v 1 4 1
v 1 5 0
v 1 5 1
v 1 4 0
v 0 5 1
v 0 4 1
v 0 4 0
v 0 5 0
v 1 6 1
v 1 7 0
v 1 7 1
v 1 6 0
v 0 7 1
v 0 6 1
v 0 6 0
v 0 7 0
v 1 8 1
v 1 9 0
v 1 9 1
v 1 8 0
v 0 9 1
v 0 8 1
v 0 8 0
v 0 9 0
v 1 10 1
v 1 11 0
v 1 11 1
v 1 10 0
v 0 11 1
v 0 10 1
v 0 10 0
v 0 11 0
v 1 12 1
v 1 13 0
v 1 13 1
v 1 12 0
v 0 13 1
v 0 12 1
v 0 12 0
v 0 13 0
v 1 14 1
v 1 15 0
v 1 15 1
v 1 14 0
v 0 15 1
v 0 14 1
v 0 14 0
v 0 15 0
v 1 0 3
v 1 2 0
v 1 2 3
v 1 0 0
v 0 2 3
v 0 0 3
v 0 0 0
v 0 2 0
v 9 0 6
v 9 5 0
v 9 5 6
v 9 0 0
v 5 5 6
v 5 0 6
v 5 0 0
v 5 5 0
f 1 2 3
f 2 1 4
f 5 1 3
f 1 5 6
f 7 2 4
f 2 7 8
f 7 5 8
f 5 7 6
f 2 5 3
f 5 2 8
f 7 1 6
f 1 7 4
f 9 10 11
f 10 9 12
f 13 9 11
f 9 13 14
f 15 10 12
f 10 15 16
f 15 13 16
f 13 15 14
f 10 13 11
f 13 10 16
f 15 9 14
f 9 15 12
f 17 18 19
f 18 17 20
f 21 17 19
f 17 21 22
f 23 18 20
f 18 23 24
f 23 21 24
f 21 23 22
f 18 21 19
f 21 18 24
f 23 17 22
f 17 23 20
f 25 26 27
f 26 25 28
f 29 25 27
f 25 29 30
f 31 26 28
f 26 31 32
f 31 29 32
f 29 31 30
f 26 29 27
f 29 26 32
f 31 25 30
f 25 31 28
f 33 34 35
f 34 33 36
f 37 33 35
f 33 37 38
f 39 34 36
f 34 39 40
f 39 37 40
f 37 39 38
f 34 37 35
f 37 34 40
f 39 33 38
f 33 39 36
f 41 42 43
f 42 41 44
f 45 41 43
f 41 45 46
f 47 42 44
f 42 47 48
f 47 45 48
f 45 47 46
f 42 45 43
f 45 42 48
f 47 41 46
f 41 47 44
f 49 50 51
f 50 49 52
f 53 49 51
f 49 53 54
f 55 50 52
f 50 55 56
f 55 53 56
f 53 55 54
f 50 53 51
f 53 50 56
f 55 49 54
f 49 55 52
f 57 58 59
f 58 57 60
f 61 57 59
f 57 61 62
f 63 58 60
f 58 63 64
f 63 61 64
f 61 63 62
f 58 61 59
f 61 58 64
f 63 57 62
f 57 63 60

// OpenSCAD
cube([1,2,3]);
translate([5, 0, 0]) {
    cube([4,5,6]);
}
for(i = [0:2:10]) {
    translate([0, i+4, 0]) {
        cube([1, 1, 1]);
    }
}
